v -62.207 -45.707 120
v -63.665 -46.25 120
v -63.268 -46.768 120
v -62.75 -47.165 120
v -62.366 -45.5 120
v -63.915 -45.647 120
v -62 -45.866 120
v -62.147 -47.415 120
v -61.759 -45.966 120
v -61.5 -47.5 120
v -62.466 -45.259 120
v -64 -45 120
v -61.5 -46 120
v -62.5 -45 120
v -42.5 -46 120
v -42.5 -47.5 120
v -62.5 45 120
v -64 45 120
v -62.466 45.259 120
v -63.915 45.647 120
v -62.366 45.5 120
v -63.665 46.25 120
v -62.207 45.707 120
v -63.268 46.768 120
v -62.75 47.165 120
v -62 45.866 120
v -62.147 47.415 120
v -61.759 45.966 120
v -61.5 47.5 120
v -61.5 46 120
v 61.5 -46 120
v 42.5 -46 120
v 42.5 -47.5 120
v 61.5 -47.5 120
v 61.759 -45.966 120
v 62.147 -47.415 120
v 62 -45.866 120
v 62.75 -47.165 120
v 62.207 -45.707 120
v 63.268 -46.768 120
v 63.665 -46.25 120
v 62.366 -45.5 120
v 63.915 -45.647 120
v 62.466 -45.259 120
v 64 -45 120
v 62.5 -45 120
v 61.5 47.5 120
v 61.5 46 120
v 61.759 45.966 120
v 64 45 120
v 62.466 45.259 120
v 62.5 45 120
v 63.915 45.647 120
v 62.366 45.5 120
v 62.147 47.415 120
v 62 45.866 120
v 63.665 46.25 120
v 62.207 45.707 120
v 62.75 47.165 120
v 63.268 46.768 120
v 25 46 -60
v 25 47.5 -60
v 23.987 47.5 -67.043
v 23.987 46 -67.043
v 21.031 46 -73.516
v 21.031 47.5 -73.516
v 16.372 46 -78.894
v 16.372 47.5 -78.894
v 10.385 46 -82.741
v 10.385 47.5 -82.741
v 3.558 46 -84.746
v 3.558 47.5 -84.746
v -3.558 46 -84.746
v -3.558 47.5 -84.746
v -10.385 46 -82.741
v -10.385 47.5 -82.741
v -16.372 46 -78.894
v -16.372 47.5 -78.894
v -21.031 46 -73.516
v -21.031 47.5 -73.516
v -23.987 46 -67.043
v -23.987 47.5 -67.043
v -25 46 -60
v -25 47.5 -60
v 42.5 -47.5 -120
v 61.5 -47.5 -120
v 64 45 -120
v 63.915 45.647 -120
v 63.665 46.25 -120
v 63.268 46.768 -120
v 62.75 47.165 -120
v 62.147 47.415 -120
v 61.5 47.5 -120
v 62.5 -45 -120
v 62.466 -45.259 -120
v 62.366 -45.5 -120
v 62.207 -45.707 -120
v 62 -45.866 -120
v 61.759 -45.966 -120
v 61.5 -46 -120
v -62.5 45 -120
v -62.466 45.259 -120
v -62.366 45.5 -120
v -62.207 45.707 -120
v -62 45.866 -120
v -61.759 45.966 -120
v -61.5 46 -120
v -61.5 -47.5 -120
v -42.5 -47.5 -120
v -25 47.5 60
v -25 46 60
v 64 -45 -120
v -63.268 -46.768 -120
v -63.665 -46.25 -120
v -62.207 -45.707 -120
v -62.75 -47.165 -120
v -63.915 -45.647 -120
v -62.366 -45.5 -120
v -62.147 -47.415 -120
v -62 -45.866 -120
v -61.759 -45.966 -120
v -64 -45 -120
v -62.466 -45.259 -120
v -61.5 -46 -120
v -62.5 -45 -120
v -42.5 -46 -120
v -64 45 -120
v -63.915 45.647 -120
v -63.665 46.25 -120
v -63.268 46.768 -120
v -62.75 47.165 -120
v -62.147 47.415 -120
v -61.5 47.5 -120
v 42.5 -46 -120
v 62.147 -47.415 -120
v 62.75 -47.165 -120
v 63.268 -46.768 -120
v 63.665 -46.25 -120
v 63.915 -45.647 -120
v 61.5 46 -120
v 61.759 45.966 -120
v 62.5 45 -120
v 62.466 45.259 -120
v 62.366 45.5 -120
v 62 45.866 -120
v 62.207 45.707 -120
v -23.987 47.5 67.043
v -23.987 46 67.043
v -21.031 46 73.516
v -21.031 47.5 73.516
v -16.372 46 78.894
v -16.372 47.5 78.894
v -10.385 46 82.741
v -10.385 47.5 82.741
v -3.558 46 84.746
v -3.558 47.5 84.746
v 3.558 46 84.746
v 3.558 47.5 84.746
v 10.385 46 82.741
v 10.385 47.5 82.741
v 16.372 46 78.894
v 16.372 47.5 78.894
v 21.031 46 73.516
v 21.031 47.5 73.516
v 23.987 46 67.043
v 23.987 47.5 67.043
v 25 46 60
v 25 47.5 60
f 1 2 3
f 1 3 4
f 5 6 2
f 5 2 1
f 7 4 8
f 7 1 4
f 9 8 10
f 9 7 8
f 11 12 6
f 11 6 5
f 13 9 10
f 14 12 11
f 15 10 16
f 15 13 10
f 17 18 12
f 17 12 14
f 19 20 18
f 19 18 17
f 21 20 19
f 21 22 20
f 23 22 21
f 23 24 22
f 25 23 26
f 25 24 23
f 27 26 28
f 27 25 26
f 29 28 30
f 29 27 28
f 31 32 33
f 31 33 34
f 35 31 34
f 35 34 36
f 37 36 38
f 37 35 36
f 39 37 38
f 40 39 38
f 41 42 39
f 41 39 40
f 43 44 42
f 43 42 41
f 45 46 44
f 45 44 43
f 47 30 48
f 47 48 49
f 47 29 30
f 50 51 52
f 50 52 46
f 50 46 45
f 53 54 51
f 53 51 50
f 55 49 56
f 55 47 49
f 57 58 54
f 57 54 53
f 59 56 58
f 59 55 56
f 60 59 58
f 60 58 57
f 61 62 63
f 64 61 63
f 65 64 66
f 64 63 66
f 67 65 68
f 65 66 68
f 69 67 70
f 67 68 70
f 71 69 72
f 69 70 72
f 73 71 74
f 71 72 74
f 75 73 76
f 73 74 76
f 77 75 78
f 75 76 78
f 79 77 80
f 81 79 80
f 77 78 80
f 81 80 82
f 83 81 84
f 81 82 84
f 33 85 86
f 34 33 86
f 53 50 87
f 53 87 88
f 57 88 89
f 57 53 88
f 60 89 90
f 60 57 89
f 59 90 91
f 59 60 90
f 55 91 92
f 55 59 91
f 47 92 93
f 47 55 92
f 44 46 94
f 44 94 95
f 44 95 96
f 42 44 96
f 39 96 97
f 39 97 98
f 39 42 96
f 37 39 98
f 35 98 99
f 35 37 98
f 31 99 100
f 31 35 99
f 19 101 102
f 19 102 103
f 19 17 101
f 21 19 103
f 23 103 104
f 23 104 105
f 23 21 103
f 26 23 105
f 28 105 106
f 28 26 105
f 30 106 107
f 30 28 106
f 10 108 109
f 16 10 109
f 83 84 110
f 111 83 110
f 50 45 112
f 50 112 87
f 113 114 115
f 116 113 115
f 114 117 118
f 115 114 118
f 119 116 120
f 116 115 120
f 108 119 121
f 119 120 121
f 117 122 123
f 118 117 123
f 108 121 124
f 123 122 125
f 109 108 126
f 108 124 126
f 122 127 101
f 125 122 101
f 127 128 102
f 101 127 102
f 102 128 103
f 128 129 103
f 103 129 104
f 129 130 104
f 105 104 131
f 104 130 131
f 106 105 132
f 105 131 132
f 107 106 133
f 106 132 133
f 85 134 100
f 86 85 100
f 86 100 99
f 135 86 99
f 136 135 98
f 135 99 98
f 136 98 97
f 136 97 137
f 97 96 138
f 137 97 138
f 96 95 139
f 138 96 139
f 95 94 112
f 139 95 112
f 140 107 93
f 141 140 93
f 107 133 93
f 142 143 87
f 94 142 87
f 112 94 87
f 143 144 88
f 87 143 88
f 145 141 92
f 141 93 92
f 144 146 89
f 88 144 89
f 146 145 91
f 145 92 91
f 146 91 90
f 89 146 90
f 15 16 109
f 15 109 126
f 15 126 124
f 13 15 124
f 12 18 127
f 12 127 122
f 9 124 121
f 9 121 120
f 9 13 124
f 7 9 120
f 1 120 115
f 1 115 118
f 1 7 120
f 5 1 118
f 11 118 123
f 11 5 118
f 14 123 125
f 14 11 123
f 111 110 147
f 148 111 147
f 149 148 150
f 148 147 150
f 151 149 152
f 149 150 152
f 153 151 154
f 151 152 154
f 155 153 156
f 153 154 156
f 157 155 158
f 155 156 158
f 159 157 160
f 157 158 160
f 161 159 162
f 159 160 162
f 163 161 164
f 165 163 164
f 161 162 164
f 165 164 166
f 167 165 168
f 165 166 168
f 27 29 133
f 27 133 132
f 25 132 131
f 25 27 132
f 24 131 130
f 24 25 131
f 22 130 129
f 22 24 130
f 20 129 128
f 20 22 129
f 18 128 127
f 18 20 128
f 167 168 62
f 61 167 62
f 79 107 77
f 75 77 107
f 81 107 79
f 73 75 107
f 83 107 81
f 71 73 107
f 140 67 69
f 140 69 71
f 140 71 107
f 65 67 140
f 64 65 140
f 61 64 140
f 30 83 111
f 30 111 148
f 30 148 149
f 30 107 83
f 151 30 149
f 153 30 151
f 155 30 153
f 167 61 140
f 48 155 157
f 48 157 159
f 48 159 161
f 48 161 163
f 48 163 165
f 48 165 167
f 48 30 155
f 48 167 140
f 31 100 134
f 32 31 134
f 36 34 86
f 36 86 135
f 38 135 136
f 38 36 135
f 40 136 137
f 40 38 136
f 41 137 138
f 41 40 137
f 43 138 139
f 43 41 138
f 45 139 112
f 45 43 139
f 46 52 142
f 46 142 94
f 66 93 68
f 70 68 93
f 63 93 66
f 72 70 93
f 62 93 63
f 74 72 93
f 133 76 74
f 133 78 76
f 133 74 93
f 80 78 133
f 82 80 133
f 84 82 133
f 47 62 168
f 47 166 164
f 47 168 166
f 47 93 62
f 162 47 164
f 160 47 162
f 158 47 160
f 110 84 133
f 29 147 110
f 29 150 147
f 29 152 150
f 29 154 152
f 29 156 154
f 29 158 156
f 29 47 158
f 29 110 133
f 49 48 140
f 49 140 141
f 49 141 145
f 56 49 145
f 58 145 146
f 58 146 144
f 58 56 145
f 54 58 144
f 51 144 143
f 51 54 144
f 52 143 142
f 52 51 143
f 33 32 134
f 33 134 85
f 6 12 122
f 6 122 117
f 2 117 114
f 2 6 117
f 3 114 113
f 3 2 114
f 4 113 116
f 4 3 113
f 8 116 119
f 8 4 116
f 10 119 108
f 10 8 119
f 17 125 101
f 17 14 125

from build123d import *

# Parameters (mm, degrees)
F1_DEPTH = 120
F4_DEPTH = 25


with BuildPart() as f1:
    # F0 (on Top) → F1 (new body, symmetric)
    with BuildSketch(Plane.XY):
        with BuildLine():
            ThreePointArc((-62.5, 45), (-62.207107, 45.707107), (-61.5, 46))
            Line((-61.5, 46), (61.5, 46))
            ThreePointArc((61.5, 46), (62.207107, 45.707107), (62.5, 45))
            Line((62.5, 45), (62.5, -45))
            ThreePointArc((62.5, -45), (62.207107, -45.707107), (61.5, -46))
            Line((61.5, -46), (42.5, -46))
            Line((42.5, -46), (42.5, -47.5))
            Line((42.5, -47.5), (61.5, -47.5))
            ThreePointArc((61.5, -47.5), (63.267767, -46.767767), (64, -45))
            Line((64, -45), (64, 45))
            ThreePointArc((64, 45), (63.267767, 46.767767), (61.5, 47.5))
            Line((61.5, 47.5), (-61.5, 47.5))
            ThreePointArc((-61.5, 47.5), (-63.267767, 46.767767), (-64, 45))
            Line((-64, 45), (-64, -45))
            ThreePointArc((-64, -45), (-63.267767, -46.767767), (-61.5, -47.5))
            Line((-61.5, -47.5), (-42.5, -47.5))
            Line((-42.5, -47.5), (-42.5, -46))
            Line((-42.5, -46), (-61.5, -46))
            ThreePointArc((-61.5, -46), (-62.207107, -45.707107), (-62.5, -45))
            Line((-62.5, -45), (-62.5, 45))
        make_face()
    extrude(amount=F1_DEPTH, both=True)

    # F3 (on face) → F4 (cut)
    with BuildSketch(Plane(origin=(0, 47.5, 0), x_dir=(-1, 0, 0), z_dir=(0, 1, 0))):
        with BuildLine():
            Line((-25, 60), (-25, -60))
            ThreePointArc((-25, -60), (0, -85), (25, -60))
            Line((25, -60), (25, 60))
            ThreePointArc((25, 60), (0, 85), (-25, 60))
        make_face()
    extrude(amount=-F4_DEPTH, mode=Mode.SUBTRACT)


solid = f1.part
